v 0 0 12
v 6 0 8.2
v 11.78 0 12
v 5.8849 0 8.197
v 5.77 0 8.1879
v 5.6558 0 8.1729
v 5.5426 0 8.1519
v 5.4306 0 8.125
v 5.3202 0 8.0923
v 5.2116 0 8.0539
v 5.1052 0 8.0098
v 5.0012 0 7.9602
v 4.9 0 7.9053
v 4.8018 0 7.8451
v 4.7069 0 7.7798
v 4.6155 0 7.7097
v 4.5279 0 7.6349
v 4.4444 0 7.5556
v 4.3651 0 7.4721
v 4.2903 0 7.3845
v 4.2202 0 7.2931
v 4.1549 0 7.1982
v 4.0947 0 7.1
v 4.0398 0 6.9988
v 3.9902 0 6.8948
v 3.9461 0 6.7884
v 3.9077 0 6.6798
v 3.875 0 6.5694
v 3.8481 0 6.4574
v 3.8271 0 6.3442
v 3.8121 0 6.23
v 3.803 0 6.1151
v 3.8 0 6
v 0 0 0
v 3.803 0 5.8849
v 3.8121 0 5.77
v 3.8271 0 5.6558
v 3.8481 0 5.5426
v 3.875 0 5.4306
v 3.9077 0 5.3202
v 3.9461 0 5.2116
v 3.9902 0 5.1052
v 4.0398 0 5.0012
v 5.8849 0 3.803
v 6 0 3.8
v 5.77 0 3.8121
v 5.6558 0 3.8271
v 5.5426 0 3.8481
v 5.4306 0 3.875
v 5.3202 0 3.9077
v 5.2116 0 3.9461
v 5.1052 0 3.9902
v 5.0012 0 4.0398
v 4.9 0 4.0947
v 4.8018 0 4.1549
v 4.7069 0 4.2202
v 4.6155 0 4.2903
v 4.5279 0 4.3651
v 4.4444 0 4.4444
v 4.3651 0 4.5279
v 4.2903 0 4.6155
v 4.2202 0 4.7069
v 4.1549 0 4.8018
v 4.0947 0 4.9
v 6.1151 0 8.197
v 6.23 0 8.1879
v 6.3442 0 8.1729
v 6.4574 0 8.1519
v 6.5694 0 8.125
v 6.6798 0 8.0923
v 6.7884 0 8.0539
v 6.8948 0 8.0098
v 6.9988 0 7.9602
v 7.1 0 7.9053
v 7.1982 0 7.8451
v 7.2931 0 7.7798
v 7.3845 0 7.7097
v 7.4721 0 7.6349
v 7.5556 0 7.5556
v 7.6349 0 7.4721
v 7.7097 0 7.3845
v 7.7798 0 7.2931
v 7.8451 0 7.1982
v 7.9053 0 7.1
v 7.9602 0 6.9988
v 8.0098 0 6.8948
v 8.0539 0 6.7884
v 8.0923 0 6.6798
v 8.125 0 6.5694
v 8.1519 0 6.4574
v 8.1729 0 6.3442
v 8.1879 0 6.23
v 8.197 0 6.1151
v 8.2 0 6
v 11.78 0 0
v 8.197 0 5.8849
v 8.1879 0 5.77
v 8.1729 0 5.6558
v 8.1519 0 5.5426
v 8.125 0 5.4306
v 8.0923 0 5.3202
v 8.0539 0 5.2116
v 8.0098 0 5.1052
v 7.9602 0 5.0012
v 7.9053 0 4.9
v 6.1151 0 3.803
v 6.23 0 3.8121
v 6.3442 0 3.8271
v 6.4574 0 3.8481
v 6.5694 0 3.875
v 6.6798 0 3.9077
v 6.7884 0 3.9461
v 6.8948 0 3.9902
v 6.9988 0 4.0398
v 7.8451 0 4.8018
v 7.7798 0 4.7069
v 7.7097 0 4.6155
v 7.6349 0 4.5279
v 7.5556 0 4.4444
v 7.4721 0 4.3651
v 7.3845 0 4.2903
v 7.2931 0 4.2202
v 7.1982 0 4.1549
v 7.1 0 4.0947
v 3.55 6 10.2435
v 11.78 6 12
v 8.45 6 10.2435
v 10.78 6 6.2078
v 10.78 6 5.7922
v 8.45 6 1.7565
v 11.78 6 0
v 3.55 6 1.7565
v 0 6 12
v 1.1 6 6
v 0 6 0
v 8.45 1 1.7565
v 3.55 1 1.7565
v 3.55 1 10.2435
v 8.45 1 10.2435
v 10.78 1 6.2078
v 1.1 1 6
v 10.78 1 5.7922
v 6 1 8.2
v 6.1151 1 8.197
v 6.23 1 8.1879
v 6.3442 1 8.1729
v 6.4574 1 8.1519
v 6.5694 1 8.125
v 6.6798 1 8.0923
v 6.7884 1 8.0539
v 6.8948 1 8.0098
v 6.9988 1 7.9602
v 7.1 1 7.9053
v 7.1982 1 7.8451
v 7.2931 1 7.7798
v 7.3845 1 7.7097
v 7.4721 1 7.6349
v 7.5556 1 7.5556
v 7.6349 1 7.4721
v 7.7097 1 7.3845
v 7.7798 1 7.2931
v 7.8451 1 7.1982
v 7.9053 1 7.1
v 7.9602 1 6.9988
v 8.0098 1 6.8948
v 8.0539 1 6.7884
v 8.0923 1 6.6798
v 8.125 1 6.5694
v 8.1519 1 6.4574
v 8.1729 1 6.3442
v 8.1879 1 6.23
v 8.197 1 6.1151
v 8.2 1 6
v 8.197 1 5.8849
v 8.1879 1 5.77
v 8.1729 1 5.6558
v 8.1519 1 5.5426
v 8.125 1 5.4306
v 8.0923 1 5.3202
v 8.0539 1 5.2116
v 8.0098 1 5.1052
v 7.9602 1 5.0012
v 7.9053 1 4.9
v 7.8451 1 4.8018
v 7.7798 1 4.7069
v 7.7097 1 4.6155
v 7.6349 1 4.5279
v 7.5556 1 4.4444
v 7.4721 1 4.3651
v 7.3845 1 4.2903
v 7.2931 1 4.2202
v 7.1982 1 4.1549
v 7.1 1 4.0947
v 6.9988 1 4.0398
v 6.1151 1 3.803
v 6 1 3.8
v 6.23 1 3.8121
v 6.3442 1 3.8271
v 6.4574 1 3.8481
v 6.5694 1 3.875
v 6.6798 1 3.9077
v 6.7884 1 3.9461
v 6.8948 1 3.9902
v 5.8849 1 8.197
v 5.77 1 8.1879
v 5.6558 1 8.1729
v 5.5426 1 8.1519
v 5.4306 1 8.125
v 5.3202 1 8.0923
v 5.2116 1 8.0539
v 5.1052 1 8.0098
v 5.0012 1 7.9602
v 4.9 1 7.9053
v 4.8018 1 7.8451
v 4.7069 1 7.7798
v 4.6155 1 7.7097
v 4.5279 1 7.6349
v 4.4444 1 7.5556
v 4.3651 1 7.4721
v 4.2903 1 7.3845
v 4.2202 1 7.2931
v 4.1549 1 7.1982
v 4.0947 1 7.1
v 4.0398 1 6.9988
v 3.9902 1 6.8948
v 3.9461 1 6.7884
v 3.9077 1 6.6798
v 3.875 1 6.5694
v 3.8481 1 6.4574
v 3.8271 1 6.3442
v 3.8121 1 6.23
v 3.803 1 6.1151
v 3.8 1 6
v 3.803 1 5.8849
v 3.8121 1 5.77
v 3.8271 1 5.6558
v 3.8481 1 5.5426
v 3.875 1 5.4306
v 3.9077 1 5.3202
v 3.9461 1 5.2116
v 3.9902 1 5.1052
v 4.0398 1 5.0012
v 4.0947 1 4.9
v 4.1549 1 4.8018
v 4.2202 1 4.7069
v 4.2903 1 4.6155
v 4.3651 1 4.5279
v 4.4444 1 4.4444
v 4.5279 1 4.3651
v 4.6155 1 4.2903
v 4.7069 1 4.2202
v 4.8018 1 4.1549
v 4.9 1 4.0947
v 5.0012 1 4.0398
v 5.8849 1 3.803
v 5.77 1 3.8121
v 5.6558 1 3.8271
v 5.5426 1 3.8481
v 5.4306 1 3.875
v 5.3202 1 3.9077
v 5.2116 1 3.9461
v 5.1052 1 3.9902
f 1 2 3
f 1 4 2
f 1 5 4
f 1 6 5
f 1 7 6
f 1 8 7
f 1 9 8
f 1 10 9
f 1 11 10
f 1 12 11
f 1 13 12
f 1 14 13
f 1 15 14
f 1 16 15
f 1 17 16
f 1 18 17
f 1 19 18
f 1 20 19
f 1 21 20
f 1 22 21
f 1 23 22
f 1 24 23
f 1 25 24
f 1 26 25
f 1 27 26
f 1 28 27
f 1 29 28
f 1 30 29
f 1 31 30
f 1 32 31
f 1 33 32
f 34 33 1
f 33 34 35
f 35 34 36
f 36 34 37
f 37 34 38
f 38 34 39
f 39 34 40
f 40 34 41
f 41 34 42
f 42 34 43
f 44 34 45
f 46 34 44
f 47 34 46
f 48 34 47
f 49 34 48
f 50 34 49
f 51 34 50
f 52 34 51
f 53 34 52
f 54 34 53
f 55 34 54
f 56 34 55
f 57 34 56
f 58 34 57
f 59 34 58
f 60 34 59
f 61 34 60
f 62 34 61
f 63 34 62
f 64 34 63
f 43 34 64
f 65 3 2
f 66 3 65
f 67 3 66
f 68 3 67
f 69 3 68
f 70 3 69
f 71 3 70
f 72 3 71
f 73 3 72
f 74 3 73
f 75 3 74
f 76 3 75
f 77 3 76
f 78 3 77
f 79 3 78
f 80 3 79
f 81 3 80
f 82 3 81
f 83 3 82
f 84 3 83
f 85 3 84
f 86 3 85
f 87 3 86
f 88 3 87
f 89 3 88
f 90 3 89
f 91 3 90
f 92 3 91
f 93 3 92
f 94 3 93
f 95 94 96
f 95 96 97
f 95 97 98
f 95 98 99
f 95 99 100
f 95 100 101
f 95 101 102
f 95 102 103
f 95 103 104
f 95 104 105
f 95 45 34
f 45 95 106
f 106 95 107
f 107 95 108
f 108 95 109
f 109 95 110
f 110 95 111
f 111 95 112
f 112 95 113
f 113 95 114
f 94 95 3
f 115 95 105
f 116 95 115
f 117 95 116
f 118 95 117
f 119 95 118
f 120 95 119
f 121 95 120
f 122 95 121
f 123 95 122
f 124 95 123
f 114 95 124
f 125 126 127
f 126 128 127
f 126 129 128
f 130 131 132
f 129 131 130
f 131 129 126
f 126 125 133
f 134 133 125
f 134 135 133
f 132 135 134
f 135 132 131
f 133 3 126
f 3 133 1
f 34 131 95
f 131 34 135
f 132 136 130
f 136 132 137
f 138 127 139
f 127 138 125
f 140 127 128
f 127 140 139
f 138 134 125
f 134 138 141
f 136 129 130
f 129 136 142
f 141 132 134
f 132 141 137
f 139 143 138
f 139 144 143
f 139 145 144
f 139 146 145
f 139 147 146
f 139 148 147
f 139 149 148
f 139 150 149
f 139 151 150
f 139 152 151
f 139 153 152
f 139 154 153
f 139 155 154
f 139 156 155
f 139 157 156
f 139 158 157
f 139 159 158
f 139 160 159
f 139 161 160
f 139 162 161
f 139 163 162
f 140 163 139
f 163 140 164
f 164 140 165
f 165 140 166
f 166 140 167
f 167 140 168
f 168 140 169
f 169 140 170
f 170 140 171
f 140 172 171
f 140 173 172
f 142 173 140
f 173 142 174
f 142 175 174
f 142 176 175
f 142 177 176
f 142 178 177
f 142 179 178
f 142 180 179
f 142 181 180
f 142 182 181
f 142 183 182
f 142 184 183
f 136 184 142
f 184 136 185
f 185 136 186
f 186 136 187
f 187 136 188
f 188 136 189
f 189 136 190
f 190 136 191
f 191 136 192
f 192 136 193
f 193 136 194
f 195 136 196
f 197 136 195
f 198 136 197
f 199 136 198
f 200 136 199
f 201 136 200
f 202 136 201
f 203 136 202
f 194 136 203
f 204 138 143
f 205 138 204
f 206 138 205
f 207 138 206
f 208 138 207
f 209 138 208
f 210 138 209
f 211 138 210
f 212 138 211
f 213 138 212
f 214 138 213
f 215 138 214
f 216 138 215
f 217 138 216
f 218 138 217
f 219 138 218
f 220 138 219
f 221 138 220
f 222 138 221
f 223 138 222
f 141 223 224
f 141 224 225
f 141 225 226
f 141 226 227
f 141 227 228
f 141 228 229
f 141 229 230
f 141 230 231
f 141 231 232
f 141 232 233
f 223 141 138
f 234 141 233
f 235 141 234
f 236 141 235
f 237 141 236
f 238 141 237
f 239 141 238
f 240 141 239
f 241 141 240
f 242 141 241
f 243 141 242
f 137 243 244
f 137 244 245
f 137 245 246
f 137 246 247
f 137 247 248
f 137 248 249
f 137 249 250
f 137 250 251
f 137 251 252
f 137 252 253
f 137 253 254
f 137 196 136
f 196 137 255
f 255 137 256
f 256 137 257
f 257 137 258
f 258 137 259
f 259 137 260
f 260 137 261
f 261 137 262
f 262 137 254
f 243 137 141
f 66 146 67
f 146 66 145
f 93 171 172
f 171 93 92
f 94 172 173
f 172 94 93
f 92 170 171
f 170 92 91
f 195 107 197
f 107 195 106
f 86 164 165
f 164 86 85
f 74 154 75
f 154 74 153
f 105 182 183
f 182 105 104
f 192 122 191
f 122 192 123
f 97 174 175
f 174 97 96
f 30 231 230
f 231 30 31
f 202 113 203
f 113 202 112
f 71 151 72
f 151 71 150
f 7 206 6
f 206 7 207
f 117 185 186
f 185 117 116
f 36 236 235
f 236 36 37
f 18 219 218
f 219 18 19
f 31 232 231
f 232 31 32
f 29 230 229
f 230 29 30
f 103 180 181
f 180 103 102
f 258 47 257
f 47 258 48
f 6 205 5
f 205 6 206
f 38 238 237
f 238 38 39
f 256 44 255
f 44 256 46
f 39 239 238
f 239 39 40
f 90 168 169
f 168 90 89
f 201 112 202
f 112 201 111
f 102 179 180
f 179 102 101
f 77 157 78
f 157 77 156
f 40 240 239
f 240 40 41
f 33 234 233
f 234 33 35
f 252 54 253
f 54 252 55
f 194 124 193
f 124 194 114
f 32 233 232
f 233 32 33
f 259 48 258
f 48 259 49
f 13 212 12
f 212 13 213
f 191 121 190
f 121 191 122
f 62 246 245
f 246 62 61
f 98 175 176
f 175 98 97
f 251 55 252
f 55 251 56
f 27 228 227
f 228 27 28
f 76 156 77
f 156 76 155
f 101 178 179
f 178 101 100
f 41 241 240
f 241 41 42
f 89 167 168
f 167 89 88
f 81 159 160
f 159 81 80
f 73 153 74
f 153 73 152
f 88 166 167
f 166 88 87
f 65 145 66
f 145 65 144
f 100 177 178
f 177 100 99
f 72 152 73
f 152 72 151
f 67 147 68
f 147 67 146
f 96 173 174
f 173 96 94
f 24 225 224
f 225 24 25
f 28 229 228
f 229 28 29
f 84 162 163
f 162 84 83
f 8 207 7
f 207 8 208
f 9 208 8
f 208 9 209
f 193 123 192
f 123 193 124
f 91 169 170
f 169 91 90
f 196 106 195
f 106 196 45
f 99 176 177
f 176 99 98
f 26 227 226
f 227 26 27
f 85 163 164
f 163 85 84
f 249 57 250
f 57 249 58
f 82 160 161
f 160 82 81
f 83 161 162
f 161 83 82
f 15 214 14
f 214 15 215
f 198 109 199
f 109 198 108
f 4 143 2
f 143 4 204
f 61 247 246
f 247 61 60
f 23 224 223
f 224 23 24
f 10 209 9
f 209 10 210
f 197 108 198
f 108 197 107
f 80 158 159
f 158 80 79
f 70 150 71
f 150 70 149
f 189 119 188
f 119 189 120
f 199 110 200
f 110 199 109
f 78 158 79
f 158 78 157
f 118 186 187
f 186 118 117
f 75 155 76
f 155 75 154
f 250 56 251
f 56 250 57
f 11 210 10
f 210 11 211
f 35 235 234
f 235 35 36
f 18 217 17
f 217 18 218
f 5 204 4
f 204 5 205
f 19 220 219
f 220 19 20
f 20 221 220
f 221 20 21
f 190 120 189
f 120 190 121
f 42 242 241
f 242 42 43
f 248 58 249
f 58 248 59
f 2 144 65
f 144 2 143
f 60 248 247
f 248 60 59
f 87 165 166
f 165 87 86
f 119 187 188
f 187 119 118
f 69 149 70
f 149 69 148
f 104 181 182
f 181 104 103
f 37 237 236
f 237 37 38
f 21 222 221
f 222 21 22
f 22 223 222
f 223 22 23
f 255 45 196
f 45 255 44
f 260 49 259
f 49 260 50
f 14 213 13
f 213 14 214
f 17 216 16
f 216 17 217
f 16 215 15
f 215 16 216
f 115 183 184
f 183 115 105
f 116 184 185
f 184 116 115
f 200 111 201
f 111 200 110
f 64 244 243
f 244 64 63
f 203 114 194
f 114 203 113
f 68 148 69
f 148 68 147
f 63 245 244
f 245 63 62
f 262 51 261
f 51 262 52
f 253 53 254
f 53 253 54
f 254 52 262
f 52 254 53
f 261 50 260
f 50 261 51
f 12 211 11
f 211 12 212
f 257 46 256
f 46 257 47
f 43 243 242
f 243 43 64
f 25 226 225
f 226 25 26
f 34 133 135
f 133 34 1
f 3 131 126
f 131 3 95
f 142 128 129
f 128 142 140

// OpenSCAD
// Real Lonely T-Rex Game: 6/32 Nyloc Nut Mount 
// Copyright (C) 2017, Uri Shaked and Ariella Eliassaf

$fn=120;

nyloc_nut_hole_r = 7.8/2+1;
nyloc_nut_depth = 5;
hole_spacing = 9.78;

module nyloc_mount(depth=10) {
    translate([0,depth,0])
    rotate([90,0,0])
    difference() {
        cube([10,12,depth]);
        
        translate([5,6,0])
        cylinder(r=nyloc_nut_hole_r,h=nyloc_nut_depth,$fn=6);

        translate([5,6,5])
        cylinder(r=2.2,h=depth-nyloc_nut_depth);
    }
}


cube([1,6,12]);

translate([1,0,0])
    nyloc_mount(6);

translate([1+hole_spacing,0,0])
cube([1,6,12]);
